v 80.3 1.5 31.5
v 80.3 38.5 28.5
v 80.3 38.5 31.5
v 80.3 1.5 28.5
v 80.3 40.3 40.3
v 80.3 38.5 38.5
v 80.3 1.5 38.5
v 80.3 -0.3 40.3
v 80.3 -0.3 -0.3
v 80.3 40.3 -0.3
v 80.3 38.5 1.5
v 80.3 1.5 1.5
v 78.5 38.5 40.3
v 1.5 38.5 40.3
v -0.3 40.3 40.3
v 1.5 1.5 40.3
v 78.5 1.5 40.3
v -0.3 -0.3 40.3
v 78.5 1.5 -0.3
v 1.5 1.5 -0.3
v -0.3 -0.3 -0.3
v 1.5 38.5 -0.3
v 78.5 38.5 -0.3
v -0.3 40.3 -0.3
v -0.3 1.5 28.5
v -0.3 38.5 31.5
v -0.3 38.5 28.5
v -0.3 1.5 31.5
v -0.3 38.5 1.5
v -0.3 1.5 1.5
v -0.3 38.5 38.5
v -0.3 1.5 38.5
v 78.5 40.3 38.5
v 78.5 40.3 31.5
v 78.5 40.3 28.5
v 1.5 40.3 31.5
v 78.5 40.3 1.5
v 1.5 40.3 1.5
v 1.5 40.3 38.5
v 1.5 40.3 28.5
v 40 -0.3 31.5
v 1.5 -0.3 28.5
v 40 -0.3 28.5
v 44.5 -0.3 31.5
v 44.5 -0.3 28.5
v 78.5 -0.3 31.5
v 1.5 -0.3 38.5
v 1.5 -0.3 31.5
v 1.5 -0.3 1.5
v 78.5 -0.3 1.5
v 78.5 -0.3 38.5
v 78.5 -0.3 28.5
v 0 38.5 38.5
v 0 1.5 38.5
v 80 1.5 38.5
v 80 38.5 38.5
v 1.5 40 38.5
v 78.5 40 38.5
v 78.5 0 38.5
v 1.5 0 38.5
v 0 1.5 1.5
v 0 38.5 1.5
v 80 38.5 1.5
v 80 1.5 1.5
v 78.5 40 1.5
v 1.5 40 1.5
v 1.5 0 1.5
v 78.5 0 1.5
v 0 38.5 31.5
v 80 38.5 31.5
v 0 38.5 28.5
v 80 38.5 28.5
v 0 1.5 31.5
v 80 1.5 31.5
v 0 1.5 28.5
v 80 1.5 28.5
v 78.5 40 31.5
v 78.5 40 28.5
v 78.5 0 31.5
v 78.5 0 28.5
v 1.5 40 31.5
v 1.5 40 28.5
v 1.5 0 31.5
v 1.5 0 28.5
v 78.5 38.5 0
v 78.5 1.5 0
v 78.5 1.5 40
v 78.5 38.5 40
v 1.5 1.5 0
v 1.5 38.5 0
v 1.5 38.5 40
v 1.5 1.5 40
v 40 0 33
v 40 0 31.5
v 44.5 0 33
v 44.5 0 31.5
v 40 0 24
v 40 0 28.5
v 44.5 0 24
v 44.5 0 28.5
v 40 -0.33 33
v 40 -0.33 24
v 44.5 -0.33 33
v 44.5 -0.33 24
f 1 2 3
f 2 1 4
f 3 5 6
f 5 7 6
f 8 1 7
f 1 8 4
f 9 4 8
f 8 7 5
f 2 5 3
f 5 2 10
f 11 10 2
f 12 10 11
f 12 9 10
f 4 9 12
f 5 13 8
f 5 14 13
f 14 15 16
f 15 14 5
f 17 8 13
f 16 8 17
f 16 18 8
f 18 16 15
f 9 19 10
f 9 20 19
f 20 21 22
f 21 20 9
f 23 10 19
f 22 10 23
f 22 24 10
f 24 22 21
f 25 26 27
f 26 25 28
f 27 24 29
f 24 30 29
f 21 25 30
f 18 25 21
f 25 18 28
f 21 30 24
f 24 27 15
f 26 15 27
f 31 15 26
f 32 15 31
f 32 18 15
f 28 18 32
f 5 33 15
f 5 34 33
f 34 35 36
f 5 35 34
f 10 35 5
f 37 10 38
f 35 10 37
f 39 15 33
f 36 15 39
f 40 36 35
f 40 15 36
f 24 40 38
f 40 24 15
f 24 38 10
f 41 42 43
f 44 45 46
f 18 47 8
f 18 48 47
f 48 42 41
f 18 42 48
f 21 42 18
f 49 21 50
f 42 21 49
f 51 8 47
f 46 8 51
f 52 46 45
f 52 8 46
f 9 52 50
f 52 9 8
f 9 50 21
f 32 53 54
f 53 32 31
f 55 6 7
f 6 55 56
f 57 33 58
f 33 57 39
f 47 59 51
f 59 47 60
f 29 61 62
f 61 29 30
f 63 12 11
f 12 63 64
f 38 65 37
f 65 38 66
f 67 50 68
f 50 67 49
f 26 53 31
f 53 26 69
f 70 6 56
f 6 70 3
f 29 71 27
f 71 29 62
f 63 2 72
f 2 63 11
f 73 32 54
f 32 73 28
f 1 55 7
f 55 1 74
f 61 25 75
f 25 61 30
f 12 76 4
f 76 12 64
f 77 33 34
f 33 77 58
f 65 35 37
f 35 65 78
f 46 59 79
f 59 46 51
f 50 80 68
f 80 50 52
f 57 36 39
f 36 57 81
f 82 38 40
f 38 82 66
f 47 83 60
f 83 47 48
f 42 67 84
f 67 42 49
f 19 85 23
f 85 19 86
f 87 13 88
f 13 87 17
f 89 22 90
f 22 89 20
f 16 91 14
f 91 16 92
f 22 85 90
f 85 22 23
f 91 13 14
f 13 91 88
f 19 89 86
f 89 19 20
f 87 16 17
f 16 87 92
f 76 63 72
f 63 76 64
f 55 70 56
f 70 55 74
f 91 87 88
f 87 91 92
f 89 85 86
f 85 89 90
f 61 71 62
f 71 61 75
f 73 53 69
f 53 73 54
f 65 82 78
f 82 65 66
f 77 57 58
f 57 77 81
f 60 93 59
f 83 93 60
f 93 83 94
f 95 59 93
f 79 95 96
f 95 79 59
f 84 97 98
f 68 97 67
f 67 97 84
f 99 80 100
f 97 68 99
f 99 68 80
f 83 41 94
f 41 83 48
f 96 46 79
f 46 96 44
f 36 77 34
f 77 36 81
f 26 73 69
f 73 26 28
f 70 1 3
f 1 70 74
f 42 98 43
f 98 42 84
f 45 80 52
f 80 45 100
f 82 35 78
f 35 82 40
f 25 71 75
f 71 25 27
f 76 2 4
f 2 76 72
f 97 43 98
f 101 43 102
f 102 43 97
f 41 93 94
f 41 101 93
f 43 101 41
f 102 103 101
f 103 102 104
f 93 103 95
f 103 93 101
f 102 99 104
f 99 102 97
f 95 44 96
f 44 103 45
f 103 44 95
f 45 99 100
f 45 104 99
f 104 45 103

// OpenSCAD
chest_length = 80;
chest_depth = 40;

total_height = 40;
lid_height = 10;
chest_height = total_height - lid_height;
decoration_extrude = 0.3;
decoration_height = 3;

/*
// Chest body
cube([chest_length, chest_depth, chest_height]);

// Chest lid
translate([0,chest_depth,chest_height]) {
    rotate(a=[-40,0,0]) {
        translate([0, -chest_depth,0]) {
            cube([chest_length, chest_depth, lid_height]);
        }
    }
}
*/

module makechest() {
    union() {
    color("saddlebrown", 1.0)
    cube([chest_length, chest_depth, total_height]);

    color("black", 1.0)
    translate([-decoration_extrude, -decoration_extrude,
              chest_height - decoration_height / 2]) 
        cube([chest_length + 2 * decoration_extrude,
             chest_depth + 2 * decoration_extrude,
             decoration_height]);

    color("lightgray", 1.0)
    translate([chest_length / 2, 0, chest_height-decoration_height*2])
        rotate([90,0,0])
            cube([decoration_height * 1.5,
                  decoration_height * 3,
                  decoration_extrude*1.1]);

    // Larger box
    difference() {
    color("black", 1.0)
    translate([chest_length / 2,
               chest_depth / 2,
               total_height / 2])
    cube([chest_length + decoration_extrude * 2,
          chest_depth + decoration_extrude * 2,
          total_height + decoration_extrude * 2], true);


    // Minus X
    translate([chest_length / 2,
               chest_depth / 2,
               total_height / 2])
    cube([chest_length + decoration_extrude*5,
          chest_depth - decoration_height,
          total_height - decoration_height], true);

    // Minus Y
    translate([chest_length / 2,
               chest_depth / 2,
               total_height / 2])
    cube([chest_length - decoration_height,
          chest_depth + decoration_extrude*5,
          total_height - decoration_height], true);

    // Minus Z
    translate([chest_length / 2,
               chest_depth / 2,
               total_height / 2])
    cube([chest_length - decoration_height,
          chest_depth - decoration_height,
          total_height + decoration_extrude * 5], true);
    }
    }
}

makechest();
